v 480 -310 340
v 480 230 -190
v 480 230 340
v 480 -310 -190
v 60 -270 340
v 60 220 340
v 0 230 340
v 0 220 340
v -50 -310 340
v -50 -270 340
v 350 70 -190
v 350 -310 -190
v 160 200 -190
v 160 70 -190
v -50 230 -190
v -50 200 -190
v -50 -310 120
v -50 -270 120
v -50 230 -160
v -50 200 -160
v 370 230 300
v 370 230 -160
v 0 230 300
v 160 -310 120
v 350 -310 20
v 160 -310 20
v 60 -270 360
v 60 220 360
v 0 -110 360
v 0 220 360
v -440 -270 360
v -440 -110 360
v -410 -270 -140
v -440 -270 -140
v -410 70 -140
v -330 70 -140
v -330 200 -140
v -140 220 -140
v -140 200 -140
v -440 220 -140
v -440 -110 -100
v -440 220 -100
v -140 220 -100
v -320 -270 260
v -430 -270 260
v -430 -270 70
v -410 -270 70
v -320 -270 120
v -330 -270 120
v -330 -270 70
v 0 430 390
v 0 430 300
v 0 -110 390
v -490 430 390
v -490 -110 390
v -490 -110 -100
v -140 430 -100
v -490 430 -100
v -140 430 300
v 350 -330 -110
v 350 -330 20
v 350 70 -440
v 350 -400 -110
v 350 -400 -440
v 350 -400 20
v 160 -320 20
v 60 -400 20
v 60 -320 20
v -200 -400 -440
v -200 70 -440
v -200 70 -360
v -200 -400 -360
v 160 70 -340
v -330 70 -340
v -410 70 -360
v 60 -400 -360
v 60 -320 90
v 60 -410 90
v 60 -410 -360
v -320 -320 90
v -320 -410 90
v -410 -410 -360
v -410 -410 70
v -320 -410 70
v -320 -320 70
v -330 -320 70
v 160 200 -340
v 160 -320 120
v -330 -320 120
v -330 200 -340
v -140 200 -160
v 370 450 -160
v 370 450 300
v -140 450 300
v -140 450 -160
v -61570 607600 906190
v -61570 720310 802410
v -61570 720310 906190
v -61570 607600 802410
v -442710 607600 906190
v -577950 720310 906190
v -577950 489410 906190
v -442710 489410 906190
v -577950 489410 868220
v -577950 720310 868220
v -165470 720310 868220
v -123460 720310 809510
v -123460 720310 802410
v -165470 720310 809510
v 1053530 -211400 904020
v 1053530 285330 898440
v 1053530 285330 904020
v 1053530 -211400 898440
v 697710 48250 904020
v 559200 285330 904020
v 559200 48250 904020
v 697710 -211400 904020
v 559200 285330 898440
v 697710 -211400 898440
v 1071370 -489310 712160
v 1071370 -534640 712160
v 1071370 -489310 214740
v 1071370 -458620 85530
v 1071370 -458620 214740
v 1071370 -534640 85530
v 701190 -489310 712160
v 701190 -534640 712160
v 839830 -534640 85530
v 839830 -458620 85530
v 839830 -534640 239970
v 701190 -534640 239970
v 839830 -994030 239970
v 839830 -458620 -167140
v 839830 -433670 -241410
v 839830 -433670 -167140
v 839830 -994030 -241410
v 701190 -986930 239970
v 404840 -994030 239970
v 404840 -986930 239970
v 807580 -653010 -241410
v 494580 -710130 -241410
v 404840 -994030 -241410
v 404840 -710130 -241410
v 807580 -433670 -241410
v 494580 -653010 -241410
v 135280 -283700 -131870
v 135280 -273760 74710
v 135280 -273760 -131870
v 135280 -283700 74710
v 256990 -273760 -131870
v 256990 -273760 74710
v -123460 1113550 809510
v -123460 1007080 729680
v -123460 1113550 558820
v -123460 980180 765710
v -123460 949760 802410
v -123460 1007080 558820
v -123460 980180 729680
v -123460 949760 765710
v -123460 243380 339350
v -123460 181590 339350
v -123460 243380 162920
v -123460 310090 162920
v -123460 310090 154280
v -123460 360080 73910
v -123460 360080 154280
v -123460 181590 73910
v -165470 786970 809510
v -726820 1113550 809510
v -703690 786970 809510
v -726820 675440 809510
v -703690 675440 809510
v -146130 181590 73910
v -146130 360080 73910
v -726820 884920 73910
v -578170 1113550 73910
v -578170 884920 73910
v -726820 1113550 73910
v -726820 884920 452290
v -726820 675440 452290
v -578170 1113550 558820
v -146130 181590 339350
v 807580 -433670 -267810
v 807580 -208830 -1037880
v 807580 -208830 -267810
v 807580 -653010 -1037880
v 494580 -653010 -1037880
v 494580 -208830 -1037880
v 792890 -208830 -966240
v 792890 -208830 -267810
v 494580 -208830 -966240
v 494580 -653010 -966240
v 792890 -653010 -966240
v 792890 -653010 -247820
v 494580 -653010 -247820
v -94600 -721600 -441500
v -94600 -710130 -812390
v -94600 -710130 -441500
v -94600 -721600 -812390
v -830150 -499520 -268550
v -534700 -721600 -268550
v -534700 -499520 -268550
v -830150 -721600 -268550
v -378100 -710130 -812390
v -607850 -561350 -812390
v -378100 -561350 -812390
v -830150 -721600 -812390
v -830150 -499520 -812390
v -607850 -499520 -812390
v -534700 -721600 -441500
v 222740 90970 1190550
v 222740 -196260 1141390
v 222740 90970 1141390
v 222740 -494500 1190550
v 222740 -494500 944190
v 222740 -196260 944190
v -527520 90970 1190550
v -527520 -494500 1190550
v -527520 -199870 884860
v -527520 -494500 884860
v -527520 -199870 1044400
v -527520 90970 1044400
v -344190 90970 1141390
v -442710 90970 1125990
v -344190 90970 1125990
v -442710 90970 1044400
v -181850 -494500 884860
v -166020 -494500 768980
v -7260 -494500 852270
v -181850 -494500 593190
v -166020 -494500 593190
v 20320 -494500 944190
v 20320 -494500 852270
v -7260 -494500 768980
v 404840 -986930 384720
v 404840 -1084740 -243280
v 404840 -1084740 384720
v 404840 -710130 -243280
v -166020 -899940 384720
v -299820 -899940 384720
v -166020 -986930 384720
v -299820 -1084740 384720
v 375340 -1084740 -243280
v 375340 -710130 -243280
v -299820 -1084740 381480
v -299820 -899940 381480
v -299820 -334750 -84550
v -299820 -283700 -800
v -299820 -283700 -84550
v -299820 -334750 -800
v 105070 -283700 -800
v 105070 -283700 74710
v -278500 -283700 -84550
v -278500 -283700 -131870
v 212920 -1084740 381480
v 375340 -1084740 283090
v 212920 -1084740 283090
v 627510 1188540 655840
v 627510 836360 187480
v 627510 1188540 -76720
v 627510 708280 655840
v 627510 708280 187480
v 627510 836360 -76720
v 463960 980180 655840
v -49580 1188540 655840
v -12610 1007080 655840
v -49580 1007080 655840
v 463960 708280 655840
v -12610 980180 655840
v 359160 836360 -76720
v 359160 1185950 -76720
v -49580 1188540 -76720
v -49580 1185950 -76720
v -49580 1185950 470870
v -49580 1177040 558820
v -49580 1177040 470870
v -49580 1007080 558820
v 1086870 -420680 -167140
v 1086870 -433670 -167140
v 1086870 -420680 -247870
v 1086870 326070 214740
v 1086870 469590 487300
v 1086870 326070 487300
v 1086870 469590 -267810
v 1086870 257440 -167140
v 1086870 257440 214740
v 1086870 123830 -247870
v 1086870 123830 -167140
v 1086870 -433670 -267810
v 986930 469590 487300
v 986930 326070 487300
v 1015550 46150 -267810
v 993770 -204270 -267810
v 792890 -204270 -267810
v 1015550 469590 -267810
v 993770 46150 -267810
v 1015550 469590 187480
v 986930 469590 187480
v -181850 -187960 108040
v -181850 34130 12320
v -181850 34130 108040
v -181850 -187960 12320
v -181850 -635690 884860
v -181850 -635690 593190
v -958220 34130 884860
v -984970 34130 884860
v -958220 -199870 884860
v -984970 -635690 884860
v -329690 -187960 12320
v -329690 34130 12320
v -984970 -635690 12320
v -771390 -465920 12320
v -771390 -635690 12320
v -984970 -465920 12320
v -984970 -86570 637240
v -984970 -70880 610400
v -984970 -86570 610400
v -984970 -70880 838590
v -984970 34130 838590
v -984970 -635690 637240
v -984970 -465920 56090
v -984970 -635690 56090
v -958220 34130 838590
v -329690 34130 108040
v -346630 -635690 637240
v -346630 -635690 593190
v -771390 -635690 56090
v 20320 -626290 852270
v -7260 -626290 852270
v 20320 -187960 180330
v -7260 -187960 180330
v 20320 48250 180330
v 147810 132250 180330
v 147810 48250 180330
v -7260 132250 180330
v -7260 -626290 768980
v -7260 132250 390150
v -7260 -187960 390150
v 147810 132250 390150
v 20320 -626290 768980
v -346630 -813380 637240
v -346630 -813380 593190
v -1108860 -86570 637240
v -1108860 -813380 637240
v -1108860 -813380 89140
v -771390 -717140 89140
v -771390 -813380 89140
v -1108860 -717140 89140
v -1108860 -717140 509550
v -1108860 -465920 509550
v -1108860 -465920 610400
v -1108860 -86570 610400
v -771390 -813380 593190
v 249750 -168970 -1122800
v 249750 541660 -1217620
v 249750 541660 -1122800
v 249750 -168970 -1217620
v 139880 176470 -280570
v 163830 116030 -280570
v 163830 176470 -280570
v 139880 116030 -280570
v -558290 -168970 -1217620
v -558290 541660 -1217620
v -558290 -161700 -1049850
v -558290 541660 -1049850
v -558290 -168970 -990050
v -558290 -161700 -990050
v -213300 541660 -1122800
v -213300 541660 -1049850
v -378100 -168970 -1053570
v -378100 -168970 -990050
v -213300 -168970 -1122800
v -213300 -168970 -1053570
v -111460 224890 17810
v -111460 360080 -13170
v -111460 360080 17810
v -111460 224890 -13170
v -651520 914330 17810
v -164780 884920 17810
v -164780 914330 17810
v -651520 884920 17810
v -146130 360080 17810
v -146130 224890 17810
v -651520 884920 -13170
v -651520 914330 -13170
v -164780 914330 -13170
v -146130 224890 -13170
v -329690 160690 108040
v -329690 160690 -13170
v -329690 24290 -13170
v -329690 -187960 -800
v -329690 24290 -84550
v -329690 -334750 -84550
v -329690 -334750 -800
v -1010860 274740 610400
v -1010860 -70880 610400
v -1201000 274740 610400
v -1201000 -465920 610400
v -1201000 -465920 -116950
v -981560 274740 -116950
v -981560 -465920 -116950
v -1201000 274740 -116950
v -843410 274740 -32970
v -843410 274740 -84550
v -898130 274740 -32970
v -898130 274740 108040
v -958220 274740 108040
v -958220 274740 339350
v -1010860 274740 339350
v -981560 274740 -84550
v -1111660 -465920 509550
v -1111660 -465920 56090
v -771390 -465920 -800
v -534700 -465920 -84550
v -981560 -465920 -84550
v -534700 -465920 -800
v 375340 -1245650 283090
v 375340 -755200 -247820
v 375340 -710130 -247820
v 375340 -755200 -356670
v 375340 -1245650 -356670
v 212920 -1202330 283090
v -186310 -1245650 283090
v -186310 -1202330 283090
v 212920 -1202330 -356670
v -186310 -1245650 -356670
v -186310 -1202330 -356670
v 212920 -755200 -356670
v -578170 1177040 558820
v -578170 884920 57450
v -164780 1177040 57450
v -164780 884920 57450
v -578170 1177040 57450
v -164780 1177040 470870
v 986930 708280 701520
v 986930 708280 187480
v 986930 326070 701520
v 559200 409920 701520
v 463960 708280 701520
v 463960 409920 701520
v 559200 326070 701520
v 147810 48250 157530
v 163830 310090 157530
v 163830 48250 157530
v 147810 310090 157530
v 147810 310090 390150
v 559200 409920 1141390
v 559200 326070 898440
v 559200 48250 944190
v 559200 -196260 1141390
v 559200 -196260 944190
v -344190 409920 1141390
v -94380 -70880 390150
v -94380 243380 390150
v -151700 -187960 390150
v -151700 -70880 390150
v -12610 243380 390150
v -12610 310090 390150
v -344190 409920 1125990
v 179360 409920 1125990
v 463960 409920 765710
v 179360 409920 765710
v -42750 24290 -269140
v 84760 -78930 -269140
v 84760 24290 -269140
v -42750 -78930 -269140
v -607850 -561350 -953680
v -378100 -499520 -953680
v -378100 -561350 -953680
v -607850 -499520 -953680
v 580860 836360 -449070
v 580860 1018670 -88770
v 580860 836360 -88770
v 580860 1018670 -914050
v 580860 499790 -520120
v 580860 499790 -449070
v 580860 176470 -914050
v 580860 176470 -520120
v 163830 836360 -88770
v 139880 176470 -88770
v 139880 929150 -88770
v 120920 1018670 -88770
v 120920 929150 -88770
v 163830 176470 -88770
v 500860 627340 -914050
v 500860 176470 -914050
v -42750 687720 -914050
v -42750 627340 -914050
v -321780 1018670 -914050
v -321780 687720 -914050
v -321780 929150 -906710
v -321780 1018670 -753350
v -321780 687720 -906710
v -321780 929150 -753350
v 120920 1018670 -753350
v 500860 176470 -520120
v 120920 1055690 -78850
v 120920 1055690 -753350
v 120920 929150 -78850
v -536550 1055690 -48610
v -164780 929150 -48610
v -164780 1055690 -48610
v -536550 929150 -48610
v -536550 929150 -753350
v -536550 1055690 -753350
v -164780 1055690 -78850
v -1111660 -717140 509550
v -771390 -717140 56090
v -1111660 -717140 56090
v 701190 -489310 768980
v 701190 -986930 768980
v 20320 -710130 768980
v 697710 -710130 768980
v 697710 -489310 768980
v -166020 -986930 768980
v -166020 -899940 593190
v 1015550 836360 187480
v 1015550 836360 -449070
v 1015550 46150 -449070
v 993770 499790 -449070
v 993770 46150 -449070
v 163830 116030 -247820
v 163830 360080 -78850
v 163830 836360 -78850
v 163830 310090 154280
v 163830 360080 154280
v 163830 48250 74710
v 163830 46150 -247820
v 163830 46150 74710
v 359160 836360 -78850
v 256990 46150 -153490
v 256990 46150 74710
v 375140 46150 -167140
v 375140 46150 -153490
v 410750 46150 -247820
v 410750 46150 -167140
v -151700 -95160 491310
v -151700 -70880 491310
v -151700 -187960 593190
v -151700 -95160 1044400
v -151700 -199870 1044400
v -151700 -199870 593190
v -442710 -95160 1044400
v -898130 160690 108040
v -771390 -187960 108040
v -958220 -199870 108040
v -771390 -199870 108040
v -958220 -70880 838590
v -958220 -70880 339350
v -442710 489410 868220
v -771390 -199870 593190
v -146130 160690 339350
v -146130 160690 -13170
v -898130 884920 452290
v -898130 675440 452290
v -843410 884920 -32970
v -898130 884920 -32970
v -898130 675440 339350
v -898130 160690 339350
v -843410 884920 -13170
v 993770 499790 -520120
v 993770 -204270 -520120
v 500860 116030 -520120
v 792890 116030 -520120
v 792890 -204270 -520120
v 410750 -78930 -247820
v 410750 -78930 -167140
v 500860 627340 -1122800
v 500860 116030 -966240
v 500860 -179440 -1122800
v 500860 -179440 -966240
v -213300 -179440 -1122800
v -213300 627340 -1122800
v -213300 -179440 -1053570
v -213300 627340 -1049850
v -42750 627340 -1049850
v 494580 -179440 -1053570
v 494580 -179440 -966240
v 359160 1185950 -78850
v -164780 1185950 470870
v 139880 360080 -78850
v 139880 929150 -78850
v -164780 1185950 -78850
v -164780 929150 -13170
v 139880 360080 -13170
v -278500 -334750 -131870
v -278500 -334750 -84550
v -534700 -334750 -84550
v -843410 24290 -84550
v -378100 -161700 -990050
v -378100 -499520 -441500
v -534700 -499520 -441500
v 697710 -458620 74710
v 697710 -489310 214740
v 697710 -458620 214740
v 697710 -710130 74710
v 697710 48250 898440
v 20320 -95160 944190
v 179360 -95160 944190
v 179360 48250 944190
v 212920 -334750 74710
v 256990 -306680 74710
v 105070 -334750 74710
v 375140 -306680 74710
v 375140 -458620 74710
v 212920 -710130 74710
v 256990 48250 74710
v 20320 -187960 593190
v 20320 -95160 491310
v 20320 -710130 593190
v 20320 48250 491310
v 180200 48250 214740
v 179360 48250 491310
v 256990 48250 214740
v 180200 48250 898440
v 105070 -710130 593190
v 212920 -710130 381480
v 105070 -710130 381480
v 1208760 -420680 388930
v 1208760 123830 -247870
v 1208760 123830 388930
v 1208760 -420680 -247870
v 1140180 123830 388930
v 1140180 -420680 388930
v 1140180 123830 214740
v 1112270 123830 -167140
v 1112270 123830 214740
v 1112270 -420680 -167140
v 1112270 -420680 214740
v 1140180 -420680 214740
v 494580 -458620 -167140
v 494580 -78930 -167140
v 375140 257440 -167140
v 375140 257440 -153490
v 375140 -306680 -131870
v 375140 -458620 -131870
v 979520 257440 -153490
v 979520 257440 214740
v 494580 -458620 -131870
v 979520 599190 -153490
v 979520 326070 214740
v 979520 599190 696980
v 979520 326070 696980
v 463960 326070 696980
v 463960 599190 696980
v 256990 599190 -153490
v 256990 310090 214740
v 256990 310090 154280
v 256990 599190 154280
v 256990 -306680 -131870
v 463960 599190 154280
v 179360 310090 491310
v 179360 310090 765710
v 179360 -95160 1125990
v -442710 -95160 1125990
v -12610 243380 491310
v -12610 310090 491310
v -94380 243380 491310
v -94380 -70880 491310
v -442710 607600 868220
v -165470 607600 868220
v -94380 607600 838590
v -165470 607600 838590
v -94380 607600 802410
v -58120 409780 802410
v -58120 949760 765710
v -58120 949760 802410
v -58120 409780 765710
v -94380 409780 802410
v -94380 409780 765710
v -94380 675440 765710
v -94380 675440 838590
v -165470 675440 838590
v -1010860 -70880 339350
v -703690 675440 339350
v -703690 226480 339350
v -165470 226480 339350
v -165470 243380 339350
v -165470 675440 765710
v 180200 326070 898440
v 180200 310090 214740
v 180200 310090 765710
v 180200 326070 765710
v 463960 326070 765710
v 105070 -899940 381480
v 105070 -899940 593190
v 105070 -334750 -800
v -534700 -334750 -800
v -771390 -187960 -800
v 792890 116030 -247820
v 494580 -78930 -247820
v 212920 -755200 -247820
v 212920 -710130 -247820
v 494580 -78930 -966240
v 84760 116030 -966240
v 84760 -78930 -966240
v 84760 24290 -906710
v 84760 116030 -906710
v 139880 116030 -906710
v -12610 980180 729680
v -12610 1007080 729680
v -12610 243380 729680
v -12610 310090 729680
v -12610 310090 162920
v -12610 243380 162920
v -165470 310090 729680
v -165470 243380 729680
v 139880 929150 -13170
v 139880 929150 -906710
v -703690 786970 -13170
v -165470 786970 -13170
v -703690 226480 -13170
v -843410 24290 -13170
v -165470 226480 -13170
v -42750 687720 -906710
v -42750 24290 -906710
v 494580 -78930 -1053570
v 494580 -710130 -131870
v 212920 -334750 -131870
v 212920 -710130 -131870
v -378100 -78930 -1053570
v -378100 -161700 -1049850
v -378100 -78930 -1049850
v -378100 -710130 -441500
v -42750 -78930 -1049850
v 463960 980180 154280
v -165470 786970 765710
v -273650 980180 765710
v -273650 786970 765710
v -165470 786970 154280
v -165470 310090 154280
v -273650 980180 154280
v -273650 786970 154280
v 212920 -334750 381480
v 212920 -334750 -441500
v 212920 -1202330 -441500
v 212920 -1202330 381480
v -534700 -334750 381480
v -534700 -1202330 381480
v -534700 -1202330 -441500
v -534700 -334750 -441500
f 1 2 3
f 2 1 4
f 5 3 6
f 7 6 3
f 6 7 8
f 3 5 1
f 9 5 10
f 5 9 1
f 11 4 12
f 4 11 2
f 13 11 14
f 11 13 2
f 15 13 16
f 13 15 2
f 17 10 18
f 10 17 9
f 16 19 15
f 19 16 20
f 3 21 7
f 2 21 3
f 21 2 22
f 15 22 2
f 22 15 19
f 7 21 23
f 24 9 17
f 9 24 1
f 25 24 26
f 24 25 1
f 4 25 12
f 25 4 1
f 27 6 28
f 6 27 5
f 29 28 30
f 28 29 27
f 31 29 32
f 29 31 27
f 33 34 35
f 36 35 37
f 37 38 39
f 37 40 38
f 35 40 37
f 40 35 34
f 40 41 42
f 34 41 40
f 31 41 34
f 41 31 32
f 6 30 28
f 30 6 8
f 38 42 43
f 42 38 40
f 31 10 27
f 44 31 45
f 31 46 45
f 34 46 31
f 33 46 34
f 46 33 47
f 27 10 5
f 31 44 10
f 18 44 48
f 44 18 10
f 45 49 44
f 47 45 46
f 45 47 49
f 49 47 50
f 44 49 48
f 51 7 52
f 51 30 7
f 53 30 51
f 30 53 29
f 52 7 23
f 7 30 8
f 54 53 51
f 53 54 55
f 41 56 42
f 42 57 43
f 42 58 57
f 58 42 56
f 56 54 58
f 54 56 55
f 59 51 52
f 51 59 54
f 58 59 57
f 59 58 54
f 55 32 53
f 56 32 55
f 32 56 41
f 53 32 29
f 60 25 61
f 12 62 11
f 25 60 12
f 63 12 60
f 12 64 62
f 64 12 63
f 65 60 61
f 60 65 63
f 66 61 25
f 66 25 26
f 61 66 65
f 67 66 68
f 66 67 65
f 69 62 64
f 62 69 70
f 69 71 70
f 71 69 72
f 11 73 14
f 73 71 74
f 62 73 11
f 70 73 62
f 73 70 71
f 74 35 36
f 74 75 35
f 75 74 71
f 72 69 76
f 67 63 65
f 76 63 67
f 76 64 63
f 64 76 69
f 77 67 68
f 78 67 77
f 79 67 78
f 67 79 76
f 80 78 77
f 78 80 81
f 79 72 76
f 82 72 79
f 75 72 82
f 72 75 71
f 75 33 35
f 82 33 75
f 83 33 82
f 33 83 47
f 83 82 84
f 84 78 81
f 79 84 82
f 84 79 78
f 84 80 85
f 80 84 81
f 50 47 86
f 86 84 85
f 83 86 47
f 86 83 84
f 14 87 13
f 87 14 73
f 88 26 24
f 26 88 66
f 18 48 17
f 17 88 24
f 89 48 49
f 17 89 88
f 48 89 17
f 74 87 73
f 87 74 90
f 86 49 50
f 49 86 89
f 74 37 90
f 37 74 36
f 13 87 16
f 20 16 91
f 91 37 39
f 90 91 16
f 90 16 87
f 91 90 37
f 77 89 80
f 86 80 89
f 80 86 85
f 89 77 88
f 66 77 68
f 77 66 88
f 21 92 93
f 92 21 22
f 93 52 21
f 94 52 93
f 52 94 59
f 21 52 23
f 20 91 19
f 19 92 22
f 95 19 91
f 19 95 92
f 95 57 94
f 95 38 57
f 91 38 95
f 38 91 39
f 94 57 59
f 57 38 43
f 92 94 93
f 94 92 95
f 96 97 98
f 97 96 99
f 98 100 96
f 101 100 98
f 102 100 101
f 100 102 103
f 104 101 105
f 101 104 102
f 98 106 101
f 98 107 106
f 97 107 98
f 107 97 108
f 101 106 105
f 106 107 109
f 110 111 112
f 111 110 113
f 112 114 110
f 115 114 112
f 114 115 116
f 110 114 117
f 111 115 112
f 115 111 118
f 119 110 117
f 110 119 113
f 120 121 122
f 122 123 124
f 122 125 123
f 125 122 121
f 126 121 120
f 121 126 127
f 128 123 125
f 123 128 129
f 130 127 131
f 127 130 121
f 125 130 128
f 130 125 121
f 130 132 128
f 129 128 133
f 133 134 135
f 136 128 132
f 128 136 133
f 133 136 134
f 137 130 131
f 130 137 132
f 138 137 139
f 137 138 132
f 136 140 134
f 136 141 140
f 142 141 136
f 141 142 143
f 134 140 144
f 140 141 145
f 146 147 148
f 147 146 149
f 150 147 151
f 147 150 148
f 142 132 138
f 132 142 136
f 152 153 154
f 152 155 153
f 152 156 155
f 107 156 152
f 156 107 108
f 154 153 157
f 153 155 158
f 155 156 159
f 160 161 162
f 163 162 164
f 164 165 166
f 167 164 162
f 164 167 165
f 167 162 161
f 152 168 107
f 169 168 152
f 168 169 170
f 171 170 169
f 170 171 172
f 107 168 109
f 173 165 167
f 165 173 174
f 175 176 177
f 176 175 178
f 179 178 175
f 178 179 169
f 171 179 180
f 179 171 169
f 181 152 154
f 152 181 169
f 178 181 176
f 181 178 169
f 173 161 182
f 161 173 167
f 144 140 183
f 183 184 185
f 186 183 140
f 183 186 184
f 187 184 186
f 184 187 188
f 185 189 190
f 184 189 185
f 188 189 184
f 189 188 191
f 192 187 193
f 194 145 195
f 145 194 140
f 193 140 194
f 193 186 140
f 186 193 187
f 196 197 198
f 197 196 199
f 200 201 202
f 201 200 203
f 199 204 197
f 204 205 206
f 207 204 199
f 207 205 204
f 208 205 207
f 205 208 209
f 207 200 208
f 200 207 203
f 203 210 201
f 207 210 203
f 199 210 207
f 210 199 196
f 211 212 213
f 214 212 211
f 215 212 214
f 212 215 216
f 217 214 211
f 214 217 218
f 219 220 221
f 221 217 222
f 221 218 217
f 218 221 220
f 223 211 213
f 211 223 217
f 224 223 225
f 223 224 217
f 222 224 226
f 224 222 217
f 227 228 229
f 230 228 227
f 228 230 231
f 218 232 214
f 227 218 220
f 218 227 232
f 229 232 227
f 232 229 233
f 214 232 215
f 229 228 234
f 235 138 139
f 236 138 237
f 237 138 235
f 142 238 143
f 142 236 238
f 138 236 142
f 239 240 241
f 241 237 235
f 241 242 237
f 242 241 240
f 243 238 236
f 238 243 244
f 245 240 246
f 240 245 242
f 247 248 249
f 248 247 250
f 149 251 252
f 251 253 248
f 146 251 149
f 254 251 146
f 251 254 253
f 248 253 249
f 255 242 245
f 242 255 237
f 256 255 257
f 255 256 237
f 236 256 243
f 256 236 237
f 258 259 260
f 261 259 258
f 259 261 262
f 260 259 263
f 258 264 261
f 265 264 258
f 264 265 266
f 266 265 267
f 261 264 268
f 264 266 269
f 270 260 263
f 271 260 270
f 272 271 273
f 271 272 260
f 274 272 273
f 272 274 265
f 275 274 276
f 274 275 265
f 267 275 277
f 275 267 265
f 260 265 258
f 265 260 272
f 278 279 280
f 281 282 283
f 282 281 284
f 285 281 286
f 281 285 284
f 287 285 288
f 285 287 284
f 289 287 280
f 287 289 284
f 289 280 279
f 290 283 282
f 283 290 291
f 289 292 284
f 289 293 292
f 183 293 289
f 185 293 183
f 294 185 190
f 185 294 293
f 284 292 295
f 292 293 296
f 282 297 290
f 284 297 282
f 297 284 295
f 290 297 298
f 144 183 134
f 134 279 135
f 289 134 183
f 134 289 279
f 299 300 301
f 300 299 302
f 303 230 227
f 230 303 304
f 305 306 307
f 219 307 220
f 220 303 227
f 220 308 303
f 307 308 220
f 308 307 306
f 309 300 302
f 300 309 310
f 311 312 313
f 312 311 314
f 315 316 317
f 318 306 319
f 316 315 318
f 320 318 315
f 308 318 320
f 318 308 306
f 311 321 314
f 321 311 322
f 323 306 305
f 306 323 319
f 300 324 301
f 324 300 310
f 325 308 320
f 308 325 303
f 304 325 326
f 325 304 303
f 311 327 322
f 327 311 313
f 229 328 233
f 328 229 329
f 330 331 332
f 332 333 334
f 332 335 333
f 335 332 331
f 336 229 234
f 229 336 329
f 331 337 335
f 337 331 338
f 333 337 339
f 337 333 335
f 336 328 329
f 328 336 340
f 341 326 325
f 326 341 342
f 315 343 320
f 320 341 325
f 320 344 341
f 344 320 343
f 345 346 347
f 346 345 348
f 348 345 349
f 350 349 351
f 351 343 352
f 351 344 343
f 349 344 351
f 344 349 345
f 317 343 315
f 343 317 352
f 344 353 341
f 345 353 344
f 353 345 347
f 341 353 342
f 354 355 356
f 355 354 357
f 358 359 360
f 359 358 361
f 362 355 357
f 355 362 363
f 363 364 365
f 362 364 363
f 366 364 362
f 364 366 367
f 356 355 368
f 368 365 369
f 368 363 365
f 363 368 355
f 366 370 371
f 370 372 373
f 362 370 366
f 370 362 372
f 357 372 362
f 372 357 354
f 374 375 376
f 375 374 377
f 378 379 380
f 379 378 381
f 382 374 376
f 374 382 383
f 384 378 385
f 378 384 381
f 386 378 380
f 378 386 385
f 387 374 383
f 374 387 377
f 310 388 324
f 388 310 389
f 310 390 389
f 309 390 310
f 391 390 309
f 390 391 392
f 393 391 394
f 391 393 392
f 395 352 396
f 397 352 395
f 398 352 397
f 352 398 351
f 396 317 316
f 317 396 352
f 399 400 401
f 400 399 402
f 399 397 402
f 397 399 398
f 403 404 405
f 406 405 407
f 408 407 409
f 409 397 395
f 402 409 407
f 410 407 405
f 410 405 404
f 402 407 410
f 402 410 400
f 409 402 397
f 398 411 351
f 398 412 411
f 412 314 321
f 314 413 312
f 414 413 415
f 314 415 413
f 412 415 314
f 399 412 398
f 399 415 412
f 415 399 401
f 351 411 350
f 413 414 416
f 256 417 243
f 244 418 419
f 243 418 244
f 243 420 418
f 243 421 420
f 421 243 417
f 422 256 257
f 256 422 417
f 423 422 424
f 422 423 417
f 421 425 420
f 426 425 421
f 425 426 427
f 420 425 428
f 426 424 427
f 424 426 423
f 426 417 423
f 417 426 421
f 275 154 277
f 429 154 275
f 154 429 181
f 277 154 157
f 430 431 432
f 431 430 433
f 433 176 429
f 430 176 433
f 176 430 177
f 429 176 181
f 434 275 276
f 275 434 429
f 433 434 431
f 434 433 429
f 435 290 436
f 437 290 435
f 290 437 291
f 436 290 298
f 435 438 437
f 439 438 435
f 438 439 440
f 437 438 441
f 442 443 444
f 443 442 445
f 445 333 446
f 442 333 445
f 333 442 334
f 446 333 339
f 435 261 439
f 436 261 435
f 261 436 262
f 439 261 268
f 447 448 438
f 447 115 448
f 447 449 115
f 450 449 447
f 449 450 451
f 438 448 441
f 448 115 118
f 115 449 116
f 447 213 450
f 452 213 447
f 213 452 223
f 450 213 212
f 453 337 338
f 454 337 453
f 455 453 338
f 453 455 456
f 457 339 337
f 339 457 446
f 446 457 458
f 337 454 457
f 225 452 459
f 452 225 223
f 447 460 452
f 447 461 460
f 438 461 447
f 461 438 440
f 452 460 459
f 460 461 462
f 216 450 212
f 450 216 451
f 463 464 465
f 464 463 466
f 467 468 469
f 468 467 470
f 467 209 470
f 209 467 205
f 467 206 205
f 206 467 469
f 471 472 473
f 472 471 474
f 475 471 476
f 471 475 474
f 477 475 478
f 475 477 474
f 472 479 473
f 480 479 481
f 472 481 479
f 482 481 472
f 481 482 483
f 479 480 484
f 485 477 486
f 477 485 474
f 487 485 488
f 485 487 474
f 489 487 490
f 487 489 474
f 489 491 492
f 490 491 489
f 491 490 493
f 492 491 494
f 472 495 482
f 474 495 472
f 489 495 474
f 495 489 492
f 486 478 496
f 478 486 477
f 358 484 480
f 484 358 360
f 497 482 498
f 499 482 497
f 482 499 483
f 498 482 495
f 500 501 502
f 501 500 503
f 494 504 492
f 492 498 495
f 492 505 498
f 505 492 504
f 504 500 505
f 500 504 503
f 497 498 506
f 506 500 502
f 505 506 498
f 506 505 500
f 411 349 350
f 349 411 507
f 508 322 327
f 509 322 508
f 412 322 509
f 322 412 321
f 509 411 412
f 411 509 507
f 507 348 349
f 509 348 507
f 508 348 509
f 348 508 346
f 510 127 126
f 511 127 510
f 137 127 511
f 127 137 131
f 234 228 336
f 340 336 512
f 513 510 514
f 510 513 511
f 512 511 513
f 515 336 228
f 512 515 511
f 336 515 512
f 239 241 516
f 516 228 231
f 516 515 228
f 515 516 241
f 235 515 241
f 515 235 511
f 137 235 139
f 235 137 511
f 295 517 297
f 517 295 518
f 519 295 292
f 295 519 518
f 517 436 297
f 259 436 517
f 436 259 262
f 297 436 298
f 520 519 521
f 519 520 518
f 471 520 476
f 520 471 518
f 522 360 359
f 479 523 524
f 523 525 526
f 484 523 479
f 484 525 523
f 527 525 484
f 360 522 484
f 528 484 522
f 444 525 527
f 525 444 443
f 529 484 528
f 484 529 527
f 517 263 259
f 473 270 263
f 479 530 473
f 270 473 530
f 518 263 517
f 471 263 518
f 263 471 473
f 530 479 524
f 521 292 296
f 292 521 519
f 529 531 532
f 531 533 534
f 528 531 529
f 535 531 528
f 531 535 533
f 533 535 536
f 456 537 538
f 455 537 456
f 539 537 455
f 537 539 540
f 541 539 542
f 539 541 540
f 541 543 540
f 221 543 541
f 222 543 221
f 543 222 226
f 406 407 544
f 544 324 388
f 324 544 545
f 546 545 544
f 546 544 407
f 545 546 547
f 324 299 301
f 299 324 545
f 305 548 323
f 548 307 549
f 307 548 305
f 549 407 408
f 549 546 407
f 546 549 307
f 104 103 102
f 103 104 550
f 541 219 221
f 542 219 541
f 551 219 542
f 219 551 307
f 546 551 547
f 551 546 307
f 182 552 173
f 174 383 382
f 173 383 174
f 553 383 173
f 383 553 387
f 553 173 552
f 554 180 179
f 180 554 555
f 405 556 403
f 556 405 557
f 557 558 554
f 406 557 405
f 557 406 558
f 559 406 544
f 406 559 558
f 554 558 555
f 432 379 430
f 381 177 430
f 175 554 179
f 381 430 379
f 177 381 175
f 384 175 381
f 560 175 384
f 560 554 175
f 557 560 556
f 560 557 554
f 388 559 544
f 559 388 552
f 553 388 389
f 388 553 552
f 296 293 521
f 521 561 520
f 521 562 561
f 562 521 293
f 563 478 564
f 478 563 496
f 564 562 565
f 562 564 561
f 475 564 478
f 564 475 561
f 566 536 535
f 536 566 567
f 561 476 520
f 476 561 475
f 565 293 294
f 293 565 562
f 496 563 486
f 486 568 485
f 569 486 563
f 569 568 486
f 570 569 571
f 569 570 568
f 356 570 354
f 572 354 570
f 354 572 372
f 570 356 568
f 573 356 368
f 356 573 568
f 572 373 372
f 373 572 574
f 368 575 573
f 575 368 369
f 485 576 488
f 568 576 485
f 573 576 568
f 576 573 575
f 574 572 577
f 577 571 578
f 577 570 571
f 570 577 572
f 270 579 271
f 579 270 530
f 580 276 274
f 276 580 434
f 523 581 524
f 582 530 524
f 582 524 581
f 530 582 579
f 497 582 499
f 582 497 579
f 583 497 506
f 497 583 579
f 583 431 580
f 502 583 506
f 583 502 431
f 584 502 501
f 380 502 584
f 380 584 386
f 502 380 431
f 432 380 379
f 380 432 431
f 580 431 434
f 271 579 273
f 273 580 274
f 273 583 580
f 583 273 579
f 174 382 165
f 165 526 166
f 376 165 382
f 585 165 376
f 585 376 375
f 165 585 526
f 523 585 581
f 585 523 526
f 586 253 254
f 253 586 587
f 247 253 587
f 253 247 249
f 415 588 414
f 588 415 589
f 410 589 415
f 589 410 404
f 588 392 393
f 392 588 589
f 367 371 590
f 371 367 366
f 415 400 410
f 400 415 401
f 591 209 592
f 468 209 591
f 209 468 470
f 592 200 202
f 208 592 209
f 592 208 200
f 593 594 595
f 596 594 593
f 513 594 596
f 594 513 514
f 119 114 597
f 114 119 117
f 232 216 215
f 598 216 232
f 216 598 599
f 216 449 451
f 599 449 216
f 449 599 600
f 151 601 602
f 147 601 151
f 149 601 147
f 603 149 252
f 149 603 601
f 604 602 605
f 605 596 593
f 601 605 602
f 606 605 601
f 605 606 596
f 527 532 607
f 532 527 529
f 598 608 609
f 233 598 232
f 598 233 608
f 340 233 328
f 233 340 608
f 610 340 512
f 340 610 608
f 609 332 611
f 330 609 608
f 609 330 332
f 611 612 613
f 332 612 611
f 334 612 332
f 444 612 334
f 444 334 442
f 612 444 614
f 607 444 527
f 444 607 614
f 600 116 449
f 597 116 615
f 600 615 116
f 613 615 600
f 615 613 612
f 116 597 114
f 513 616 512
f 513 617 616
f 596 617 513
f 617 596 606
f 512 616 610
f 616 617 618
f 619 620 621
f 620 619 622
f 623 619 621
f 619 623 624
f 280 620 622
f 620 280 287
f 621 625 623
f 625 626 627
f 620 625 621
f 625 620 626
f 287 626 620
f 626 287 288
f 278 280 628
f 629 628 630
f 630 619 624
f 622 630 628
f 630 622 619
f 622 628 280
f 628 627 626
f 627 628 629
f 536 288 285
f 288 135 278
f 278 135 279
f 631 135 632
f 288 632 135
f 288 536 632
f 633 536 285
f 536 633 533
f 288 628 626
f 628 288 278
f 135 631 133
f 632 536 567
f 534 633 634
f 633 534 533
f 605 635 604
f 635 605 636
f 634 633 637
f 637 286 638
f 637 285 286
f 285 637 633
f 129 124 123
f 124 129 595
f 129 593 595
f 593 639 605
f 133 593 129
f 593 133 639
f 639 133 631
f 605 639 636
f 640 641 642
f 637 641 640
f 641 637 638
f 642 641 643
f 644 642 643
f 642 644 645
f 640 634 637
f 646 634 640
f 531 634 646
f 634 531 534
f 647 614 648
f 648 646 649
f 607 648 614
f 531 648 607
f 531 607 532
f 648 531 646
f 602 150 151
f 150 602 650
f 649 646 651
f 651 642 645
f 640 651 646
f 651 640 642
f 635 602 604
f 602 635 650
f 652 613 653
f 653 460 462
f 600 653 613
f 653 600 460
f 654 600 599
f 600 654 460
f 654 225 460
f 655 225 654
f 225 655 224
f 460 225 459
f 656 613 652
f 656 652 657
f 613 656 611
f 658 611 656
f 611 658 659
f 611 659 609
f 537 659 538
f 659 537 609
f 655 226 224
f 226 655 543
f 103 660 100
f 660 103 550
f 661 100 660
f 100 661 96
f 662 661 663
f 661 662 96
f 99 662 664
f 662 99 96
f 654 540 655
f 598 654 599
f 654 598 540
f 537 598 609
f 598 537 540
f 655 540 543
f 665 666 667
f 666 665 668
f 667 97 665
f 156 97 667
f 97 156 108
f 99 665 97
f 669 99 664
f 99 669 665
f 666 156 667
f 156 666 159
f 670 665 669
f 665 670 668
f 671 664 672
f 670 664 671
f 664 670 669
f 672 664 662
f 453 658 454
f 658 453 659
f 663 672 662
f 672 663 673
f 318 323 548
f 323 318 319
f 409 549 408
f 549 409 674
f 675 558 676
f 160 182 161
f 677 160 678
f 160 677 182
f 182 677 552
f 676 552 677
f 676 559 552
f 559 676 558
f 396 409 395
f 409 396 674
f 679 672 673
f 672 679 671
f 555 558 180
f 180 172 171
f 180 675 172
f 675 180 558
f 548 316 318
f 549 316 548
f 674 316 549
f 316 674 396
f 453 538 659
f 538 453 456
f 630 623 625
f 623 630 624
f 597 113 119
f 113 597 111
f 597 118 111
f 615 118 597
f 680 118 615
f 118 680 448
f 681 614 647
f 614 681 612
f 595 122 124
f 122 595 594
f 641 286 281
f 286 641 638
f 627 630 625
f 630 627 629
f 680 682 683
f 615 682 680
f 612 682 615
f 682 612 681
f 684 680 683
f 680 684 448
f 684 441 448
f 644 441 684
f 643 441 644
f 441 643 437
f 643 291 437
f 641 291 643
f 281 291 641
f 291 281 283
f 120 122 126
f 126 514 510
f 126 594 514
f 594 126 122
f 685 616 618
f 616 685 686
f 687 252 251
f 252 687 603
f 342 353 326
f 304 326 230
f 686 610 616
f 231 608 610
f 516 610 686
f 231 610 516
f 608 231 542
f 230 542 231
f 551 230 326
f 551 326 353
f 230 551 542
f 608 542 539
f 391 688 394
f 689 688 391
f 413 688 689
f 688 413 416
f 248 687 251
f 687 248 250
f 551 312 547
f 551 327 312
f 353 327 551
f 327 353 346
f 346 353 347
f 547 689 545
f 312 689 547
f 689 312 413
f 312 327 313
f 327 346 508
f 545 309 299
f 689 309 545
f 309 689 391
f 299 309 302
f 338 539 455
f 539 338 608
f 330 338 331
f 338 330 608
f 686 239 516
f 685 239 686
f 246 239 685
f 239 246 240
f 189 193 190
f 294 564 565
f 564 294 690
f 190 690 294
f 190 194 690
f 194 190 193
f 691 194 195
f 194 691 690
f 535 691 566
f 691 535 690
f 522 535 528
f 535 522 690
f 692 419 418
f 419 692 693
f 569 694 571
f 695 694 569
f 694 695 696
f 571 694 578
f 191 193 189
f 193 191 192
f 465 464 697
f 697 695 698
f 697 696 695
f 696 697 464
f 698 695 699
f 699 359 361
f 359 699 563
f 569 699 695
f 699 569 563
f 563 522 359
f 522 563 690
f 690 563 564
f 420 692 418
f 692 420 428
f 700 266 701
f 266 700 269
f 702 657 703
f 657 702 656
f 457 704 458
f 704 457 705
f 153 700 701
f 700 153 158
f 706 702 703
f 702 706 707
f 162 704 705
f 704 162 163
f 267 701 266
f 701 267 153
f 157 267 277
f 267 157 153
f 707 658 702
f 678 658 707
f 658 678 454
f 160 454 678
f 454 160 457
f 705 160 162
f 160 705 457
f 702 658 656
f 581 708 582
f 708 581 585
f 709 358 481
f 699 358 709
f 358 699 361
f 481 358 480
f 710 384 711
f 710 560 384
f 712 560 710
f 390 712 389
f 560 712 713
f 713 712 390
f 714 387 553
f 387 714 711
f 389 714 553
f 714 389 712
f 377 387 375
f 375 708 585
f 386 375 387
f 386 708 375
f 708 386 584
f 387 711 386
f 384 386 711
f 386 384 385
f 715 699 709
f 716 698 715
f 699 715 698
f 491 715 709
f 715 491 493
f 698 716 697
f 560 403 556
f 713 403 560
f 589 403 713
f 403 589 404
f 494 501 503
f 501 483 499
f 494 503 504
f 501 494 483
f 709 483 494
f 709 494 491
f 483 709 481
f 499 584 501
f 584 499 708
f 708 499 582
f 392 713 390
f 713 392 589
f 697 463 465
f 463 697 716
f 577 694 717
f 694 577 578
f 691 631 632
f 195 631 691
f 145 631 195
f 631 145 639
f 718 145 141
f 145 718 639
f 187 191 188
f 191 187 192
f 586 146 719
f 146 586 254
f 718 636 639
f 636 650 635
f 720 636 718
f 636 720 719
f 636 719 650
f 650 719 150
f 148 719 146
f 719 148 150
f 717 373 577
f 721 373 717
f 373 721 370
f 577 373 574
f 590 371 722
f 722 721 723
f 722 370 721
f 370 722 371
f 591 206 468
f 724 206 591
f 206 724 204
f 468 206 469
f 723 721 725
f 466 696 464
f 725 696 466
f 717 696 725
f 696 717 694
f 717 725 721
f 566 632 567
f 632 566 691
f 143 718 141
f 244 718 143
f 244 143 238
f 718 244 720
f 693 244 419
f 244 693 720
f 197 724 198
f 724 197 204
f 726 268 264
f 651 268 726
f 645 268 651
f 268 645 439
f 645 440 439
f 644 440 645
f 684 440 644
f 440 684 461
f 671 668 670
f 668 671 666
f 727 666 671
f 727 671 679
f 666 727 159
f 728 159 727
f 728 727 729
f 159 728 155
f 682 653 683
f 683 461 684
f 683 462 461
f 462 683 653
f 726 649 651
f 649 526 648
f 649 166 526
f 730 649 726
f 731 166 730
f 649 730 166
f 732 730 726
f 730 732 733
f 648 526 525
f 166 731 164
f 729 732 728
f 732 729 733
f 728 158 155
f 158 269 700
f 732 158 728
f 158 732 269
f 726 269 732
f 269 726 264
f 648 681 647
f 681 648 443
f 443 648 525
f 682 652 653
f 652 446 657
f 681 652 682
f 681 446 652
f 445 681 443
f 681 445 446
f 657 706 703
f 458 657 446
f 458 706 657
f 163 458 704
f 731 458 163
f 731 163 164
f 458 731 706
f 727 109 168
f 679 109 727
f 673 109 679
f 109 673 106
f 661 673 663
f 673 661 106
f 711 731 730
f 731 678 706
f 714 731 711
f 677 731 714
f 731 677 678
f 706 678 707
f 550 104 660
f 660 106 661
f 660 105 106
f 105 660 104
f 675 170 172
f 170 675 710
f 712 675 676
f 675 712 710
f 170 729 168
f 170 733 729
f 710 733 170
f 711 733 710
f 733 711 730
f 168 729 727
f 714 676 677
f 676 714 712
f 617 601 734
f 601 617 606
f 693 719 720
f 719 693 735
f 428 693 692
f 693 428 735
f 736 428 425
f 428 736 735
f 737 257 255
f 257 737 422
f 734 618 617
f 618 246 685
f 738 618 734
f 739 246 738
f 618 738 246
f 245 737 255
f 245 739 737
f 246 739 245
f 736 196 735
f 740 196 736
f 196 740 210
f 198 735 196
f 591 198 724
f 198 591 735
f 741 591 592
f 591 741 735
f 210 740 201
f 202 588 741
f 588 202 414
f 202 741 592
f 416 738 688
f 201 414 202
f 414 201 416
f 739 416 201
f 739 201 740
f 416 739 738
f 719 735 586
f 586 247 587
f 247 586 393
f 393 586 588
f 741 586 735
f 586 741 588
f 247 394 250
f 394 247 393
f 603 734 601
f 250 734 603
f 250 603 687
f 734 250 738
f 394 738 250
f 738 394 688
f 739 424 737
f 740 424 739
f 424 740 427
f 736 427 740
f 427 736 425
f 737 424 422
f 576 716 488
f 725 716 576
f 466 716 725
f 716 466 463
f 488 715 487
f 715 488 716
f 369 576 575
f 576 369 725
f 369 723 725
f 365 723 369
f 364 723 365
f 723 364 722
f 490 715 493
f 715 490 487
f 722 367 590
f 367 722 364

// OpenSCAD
difference(){
 union(){
 difference(){
  union(){
  difference(){
   union(){
   difference(){
    union(){
    difference(){
     union(){
     difference(){
      union(){
      difference(){
       union(){
       difference(){
        union(){
        difference(){
         union(){
         translate([-50,-310,-190]) cube([530,540,530]);// -1
         translate([-440,-270,-140]) cube([500,490,500]);// -1
         translate([-490,-110,-100]) cube([490,540,490]);// -1
         translate([-200,-400,-440]) cube([550,470,460]);// -1
         }
        translate([260,400,-20]) cube([140,110,140]);// 0
        }
        translate([-410,-410,-360]) cube([470,480,450]);// -1
        }
       translate([-430,-450,70]) cube([110,180,190]);// 0
       }
       translate([-330,-320,-340]) cube([490,520,460]);// -1
       }
      translate([350,-460,-110]) cube([130,130,170]);// 0
      }
      translate([-140,-60,-160]) cube([510,510,460]);// -1
      translate([-577950,295640,204350]) cube([516380,424670,701840]);// -1
      translate([367310,-211400,160940]) cube([686220,496730,743080]);// -1
      translate([309990,-534640,85530]) cube([761380,689780,626630]);// -1
      translate([135280,-994030,-241410]) cube([704550,720270,481380]);// -1
      translate([-726820,181590,73910]) cube([603360,931960,735600]);// -1
      translate([-10600,-653010,-1037880]) cube([818180,444180,870800]);// -1
      translate([-830150,-721600,-812390]) cube([735550,638140,543840]);// -1
      translate([-527520,-494500,544420]) cube([750260,585470,646130]);// -1
      translate([-299820,-1084740,-243280]) cube([704660,801040,628000]);// -1
      translate([-49580,404220,-76720]) cube([677090,784320,732560]);// -1
      translate([556940,-433670,-267810]) cube([529930,903260,755110]);// -1
      translate([-984970,-635690,12320]) cube([803120,669820,872540]);// -1
      translate([-7260,-626290,180330]) cube([570180,758540,671940]);// -1
      translate([-1108860,-813380,89140]) cube([762230,726810,548100]);// -1
      translate([-558290,-168970,-1217620]) cube([808040,710630,937050]);// -1
      translate([-651520,224890,-587820]) cube([540060,689440,605630]);// -1
      translate([-1201000,-465920,-116950]) cube([871310,740660,727350]);// -1
      translate([-186310,-1245650,-356670]) cube([561650,737620,639760]);// -1
      translate([-578170,493210,57450]) cube([760660,683830,501370]);// -1
      translate([147810,-13410,157530]) cube([839120,721690,543990]);// -1
      translate([-344190,-196260,390150]) cube([903390,606180,751240]);// -1
      translate([-607850,-561350,-953680]) cube([723790,591350,684540]);// -1
      translate([-321780,176470,-914050]) cube([902640,842200,825280]);// -1
      translate([-536550,500970,-753350]) cube([657470,554720,704740]);// -1
      translate([-1111660,-717140,56090]) cube([701700,744030,453460]);// -1
      translate([-166020,-986930,51970]) cube([867210,542930,717010]);// -1
      translate([163830,46150,-449070]) cube([851720,790210,636550]);// -1
      }
     translate([-958220,-199870,108040]) cube([806520,689280,936360]);// 0
     }
     translate([-898130,160690,-32970]) cube([752000,724230,485260]);// -1
     translate([410750,-204270,-520120]) cube([583020,704060,657750]);// -1
     translate([-213300,-179440,-1122800]) cube([714160,806780,820840]);// -1
     translate([-164780,360080,-78850]) cube([523940,825870,549720]);// -1
     }
    translate([-981560,-499520,-990050]) cube([703060,931240,905500]);// 0
    translate([20320,-710130,74710]) cube([677390,758380,869480]);// 0
    }
    translate([436700,-420680,-247870]) cube([772060,544510,636800]);// -1
    }
   translate([375140,-458620,-167140]) cube([737130,716060,713780]);// 0
   translate([256990,-306680,-153490]) cube([722530,905870,850470]);// 0
   translate([-442710,-95160,491310]) cube([622070,702760,634680]);// 0
   }
   translate([-616950,409780,86550]) cube([558830,539980,715860]);// -1
   }
  translate([-1010860,-70880,339350]) cube([916480,746320,499240]);// 0
  translate([180200,-489310,214740]) cube([959980,815380,683700]);// 0
  translate([-771390,-899940,-800]) cube([876460,711980,593990]);// 0
  translate([84760,-755200,-966240]) cube([708130,871230,718420]);// 0
  }
  translate([-474880,243380,162920]) cube([462270,763700,566760]);// -1
  }
 translate([-843410,24290,-906710]) cube([983290,904860,893540]);// 0
 translate([-378100,-710130,-1053570]) cube([872680,631200,921700]);// 0
 translate([-273650,310090,154280]) cube([737610,670090,611430]);// 0
 translate([-703690,226480,-18920]) cube([538220,560490,887140]);// 0
 }
 translate([-534700,-1202330,-441500]) cube([747620,867580,822980]);// -1
 }
translate([-935330,-161700,-1049850]) cube([892580,849420,804790]);// 0
}
